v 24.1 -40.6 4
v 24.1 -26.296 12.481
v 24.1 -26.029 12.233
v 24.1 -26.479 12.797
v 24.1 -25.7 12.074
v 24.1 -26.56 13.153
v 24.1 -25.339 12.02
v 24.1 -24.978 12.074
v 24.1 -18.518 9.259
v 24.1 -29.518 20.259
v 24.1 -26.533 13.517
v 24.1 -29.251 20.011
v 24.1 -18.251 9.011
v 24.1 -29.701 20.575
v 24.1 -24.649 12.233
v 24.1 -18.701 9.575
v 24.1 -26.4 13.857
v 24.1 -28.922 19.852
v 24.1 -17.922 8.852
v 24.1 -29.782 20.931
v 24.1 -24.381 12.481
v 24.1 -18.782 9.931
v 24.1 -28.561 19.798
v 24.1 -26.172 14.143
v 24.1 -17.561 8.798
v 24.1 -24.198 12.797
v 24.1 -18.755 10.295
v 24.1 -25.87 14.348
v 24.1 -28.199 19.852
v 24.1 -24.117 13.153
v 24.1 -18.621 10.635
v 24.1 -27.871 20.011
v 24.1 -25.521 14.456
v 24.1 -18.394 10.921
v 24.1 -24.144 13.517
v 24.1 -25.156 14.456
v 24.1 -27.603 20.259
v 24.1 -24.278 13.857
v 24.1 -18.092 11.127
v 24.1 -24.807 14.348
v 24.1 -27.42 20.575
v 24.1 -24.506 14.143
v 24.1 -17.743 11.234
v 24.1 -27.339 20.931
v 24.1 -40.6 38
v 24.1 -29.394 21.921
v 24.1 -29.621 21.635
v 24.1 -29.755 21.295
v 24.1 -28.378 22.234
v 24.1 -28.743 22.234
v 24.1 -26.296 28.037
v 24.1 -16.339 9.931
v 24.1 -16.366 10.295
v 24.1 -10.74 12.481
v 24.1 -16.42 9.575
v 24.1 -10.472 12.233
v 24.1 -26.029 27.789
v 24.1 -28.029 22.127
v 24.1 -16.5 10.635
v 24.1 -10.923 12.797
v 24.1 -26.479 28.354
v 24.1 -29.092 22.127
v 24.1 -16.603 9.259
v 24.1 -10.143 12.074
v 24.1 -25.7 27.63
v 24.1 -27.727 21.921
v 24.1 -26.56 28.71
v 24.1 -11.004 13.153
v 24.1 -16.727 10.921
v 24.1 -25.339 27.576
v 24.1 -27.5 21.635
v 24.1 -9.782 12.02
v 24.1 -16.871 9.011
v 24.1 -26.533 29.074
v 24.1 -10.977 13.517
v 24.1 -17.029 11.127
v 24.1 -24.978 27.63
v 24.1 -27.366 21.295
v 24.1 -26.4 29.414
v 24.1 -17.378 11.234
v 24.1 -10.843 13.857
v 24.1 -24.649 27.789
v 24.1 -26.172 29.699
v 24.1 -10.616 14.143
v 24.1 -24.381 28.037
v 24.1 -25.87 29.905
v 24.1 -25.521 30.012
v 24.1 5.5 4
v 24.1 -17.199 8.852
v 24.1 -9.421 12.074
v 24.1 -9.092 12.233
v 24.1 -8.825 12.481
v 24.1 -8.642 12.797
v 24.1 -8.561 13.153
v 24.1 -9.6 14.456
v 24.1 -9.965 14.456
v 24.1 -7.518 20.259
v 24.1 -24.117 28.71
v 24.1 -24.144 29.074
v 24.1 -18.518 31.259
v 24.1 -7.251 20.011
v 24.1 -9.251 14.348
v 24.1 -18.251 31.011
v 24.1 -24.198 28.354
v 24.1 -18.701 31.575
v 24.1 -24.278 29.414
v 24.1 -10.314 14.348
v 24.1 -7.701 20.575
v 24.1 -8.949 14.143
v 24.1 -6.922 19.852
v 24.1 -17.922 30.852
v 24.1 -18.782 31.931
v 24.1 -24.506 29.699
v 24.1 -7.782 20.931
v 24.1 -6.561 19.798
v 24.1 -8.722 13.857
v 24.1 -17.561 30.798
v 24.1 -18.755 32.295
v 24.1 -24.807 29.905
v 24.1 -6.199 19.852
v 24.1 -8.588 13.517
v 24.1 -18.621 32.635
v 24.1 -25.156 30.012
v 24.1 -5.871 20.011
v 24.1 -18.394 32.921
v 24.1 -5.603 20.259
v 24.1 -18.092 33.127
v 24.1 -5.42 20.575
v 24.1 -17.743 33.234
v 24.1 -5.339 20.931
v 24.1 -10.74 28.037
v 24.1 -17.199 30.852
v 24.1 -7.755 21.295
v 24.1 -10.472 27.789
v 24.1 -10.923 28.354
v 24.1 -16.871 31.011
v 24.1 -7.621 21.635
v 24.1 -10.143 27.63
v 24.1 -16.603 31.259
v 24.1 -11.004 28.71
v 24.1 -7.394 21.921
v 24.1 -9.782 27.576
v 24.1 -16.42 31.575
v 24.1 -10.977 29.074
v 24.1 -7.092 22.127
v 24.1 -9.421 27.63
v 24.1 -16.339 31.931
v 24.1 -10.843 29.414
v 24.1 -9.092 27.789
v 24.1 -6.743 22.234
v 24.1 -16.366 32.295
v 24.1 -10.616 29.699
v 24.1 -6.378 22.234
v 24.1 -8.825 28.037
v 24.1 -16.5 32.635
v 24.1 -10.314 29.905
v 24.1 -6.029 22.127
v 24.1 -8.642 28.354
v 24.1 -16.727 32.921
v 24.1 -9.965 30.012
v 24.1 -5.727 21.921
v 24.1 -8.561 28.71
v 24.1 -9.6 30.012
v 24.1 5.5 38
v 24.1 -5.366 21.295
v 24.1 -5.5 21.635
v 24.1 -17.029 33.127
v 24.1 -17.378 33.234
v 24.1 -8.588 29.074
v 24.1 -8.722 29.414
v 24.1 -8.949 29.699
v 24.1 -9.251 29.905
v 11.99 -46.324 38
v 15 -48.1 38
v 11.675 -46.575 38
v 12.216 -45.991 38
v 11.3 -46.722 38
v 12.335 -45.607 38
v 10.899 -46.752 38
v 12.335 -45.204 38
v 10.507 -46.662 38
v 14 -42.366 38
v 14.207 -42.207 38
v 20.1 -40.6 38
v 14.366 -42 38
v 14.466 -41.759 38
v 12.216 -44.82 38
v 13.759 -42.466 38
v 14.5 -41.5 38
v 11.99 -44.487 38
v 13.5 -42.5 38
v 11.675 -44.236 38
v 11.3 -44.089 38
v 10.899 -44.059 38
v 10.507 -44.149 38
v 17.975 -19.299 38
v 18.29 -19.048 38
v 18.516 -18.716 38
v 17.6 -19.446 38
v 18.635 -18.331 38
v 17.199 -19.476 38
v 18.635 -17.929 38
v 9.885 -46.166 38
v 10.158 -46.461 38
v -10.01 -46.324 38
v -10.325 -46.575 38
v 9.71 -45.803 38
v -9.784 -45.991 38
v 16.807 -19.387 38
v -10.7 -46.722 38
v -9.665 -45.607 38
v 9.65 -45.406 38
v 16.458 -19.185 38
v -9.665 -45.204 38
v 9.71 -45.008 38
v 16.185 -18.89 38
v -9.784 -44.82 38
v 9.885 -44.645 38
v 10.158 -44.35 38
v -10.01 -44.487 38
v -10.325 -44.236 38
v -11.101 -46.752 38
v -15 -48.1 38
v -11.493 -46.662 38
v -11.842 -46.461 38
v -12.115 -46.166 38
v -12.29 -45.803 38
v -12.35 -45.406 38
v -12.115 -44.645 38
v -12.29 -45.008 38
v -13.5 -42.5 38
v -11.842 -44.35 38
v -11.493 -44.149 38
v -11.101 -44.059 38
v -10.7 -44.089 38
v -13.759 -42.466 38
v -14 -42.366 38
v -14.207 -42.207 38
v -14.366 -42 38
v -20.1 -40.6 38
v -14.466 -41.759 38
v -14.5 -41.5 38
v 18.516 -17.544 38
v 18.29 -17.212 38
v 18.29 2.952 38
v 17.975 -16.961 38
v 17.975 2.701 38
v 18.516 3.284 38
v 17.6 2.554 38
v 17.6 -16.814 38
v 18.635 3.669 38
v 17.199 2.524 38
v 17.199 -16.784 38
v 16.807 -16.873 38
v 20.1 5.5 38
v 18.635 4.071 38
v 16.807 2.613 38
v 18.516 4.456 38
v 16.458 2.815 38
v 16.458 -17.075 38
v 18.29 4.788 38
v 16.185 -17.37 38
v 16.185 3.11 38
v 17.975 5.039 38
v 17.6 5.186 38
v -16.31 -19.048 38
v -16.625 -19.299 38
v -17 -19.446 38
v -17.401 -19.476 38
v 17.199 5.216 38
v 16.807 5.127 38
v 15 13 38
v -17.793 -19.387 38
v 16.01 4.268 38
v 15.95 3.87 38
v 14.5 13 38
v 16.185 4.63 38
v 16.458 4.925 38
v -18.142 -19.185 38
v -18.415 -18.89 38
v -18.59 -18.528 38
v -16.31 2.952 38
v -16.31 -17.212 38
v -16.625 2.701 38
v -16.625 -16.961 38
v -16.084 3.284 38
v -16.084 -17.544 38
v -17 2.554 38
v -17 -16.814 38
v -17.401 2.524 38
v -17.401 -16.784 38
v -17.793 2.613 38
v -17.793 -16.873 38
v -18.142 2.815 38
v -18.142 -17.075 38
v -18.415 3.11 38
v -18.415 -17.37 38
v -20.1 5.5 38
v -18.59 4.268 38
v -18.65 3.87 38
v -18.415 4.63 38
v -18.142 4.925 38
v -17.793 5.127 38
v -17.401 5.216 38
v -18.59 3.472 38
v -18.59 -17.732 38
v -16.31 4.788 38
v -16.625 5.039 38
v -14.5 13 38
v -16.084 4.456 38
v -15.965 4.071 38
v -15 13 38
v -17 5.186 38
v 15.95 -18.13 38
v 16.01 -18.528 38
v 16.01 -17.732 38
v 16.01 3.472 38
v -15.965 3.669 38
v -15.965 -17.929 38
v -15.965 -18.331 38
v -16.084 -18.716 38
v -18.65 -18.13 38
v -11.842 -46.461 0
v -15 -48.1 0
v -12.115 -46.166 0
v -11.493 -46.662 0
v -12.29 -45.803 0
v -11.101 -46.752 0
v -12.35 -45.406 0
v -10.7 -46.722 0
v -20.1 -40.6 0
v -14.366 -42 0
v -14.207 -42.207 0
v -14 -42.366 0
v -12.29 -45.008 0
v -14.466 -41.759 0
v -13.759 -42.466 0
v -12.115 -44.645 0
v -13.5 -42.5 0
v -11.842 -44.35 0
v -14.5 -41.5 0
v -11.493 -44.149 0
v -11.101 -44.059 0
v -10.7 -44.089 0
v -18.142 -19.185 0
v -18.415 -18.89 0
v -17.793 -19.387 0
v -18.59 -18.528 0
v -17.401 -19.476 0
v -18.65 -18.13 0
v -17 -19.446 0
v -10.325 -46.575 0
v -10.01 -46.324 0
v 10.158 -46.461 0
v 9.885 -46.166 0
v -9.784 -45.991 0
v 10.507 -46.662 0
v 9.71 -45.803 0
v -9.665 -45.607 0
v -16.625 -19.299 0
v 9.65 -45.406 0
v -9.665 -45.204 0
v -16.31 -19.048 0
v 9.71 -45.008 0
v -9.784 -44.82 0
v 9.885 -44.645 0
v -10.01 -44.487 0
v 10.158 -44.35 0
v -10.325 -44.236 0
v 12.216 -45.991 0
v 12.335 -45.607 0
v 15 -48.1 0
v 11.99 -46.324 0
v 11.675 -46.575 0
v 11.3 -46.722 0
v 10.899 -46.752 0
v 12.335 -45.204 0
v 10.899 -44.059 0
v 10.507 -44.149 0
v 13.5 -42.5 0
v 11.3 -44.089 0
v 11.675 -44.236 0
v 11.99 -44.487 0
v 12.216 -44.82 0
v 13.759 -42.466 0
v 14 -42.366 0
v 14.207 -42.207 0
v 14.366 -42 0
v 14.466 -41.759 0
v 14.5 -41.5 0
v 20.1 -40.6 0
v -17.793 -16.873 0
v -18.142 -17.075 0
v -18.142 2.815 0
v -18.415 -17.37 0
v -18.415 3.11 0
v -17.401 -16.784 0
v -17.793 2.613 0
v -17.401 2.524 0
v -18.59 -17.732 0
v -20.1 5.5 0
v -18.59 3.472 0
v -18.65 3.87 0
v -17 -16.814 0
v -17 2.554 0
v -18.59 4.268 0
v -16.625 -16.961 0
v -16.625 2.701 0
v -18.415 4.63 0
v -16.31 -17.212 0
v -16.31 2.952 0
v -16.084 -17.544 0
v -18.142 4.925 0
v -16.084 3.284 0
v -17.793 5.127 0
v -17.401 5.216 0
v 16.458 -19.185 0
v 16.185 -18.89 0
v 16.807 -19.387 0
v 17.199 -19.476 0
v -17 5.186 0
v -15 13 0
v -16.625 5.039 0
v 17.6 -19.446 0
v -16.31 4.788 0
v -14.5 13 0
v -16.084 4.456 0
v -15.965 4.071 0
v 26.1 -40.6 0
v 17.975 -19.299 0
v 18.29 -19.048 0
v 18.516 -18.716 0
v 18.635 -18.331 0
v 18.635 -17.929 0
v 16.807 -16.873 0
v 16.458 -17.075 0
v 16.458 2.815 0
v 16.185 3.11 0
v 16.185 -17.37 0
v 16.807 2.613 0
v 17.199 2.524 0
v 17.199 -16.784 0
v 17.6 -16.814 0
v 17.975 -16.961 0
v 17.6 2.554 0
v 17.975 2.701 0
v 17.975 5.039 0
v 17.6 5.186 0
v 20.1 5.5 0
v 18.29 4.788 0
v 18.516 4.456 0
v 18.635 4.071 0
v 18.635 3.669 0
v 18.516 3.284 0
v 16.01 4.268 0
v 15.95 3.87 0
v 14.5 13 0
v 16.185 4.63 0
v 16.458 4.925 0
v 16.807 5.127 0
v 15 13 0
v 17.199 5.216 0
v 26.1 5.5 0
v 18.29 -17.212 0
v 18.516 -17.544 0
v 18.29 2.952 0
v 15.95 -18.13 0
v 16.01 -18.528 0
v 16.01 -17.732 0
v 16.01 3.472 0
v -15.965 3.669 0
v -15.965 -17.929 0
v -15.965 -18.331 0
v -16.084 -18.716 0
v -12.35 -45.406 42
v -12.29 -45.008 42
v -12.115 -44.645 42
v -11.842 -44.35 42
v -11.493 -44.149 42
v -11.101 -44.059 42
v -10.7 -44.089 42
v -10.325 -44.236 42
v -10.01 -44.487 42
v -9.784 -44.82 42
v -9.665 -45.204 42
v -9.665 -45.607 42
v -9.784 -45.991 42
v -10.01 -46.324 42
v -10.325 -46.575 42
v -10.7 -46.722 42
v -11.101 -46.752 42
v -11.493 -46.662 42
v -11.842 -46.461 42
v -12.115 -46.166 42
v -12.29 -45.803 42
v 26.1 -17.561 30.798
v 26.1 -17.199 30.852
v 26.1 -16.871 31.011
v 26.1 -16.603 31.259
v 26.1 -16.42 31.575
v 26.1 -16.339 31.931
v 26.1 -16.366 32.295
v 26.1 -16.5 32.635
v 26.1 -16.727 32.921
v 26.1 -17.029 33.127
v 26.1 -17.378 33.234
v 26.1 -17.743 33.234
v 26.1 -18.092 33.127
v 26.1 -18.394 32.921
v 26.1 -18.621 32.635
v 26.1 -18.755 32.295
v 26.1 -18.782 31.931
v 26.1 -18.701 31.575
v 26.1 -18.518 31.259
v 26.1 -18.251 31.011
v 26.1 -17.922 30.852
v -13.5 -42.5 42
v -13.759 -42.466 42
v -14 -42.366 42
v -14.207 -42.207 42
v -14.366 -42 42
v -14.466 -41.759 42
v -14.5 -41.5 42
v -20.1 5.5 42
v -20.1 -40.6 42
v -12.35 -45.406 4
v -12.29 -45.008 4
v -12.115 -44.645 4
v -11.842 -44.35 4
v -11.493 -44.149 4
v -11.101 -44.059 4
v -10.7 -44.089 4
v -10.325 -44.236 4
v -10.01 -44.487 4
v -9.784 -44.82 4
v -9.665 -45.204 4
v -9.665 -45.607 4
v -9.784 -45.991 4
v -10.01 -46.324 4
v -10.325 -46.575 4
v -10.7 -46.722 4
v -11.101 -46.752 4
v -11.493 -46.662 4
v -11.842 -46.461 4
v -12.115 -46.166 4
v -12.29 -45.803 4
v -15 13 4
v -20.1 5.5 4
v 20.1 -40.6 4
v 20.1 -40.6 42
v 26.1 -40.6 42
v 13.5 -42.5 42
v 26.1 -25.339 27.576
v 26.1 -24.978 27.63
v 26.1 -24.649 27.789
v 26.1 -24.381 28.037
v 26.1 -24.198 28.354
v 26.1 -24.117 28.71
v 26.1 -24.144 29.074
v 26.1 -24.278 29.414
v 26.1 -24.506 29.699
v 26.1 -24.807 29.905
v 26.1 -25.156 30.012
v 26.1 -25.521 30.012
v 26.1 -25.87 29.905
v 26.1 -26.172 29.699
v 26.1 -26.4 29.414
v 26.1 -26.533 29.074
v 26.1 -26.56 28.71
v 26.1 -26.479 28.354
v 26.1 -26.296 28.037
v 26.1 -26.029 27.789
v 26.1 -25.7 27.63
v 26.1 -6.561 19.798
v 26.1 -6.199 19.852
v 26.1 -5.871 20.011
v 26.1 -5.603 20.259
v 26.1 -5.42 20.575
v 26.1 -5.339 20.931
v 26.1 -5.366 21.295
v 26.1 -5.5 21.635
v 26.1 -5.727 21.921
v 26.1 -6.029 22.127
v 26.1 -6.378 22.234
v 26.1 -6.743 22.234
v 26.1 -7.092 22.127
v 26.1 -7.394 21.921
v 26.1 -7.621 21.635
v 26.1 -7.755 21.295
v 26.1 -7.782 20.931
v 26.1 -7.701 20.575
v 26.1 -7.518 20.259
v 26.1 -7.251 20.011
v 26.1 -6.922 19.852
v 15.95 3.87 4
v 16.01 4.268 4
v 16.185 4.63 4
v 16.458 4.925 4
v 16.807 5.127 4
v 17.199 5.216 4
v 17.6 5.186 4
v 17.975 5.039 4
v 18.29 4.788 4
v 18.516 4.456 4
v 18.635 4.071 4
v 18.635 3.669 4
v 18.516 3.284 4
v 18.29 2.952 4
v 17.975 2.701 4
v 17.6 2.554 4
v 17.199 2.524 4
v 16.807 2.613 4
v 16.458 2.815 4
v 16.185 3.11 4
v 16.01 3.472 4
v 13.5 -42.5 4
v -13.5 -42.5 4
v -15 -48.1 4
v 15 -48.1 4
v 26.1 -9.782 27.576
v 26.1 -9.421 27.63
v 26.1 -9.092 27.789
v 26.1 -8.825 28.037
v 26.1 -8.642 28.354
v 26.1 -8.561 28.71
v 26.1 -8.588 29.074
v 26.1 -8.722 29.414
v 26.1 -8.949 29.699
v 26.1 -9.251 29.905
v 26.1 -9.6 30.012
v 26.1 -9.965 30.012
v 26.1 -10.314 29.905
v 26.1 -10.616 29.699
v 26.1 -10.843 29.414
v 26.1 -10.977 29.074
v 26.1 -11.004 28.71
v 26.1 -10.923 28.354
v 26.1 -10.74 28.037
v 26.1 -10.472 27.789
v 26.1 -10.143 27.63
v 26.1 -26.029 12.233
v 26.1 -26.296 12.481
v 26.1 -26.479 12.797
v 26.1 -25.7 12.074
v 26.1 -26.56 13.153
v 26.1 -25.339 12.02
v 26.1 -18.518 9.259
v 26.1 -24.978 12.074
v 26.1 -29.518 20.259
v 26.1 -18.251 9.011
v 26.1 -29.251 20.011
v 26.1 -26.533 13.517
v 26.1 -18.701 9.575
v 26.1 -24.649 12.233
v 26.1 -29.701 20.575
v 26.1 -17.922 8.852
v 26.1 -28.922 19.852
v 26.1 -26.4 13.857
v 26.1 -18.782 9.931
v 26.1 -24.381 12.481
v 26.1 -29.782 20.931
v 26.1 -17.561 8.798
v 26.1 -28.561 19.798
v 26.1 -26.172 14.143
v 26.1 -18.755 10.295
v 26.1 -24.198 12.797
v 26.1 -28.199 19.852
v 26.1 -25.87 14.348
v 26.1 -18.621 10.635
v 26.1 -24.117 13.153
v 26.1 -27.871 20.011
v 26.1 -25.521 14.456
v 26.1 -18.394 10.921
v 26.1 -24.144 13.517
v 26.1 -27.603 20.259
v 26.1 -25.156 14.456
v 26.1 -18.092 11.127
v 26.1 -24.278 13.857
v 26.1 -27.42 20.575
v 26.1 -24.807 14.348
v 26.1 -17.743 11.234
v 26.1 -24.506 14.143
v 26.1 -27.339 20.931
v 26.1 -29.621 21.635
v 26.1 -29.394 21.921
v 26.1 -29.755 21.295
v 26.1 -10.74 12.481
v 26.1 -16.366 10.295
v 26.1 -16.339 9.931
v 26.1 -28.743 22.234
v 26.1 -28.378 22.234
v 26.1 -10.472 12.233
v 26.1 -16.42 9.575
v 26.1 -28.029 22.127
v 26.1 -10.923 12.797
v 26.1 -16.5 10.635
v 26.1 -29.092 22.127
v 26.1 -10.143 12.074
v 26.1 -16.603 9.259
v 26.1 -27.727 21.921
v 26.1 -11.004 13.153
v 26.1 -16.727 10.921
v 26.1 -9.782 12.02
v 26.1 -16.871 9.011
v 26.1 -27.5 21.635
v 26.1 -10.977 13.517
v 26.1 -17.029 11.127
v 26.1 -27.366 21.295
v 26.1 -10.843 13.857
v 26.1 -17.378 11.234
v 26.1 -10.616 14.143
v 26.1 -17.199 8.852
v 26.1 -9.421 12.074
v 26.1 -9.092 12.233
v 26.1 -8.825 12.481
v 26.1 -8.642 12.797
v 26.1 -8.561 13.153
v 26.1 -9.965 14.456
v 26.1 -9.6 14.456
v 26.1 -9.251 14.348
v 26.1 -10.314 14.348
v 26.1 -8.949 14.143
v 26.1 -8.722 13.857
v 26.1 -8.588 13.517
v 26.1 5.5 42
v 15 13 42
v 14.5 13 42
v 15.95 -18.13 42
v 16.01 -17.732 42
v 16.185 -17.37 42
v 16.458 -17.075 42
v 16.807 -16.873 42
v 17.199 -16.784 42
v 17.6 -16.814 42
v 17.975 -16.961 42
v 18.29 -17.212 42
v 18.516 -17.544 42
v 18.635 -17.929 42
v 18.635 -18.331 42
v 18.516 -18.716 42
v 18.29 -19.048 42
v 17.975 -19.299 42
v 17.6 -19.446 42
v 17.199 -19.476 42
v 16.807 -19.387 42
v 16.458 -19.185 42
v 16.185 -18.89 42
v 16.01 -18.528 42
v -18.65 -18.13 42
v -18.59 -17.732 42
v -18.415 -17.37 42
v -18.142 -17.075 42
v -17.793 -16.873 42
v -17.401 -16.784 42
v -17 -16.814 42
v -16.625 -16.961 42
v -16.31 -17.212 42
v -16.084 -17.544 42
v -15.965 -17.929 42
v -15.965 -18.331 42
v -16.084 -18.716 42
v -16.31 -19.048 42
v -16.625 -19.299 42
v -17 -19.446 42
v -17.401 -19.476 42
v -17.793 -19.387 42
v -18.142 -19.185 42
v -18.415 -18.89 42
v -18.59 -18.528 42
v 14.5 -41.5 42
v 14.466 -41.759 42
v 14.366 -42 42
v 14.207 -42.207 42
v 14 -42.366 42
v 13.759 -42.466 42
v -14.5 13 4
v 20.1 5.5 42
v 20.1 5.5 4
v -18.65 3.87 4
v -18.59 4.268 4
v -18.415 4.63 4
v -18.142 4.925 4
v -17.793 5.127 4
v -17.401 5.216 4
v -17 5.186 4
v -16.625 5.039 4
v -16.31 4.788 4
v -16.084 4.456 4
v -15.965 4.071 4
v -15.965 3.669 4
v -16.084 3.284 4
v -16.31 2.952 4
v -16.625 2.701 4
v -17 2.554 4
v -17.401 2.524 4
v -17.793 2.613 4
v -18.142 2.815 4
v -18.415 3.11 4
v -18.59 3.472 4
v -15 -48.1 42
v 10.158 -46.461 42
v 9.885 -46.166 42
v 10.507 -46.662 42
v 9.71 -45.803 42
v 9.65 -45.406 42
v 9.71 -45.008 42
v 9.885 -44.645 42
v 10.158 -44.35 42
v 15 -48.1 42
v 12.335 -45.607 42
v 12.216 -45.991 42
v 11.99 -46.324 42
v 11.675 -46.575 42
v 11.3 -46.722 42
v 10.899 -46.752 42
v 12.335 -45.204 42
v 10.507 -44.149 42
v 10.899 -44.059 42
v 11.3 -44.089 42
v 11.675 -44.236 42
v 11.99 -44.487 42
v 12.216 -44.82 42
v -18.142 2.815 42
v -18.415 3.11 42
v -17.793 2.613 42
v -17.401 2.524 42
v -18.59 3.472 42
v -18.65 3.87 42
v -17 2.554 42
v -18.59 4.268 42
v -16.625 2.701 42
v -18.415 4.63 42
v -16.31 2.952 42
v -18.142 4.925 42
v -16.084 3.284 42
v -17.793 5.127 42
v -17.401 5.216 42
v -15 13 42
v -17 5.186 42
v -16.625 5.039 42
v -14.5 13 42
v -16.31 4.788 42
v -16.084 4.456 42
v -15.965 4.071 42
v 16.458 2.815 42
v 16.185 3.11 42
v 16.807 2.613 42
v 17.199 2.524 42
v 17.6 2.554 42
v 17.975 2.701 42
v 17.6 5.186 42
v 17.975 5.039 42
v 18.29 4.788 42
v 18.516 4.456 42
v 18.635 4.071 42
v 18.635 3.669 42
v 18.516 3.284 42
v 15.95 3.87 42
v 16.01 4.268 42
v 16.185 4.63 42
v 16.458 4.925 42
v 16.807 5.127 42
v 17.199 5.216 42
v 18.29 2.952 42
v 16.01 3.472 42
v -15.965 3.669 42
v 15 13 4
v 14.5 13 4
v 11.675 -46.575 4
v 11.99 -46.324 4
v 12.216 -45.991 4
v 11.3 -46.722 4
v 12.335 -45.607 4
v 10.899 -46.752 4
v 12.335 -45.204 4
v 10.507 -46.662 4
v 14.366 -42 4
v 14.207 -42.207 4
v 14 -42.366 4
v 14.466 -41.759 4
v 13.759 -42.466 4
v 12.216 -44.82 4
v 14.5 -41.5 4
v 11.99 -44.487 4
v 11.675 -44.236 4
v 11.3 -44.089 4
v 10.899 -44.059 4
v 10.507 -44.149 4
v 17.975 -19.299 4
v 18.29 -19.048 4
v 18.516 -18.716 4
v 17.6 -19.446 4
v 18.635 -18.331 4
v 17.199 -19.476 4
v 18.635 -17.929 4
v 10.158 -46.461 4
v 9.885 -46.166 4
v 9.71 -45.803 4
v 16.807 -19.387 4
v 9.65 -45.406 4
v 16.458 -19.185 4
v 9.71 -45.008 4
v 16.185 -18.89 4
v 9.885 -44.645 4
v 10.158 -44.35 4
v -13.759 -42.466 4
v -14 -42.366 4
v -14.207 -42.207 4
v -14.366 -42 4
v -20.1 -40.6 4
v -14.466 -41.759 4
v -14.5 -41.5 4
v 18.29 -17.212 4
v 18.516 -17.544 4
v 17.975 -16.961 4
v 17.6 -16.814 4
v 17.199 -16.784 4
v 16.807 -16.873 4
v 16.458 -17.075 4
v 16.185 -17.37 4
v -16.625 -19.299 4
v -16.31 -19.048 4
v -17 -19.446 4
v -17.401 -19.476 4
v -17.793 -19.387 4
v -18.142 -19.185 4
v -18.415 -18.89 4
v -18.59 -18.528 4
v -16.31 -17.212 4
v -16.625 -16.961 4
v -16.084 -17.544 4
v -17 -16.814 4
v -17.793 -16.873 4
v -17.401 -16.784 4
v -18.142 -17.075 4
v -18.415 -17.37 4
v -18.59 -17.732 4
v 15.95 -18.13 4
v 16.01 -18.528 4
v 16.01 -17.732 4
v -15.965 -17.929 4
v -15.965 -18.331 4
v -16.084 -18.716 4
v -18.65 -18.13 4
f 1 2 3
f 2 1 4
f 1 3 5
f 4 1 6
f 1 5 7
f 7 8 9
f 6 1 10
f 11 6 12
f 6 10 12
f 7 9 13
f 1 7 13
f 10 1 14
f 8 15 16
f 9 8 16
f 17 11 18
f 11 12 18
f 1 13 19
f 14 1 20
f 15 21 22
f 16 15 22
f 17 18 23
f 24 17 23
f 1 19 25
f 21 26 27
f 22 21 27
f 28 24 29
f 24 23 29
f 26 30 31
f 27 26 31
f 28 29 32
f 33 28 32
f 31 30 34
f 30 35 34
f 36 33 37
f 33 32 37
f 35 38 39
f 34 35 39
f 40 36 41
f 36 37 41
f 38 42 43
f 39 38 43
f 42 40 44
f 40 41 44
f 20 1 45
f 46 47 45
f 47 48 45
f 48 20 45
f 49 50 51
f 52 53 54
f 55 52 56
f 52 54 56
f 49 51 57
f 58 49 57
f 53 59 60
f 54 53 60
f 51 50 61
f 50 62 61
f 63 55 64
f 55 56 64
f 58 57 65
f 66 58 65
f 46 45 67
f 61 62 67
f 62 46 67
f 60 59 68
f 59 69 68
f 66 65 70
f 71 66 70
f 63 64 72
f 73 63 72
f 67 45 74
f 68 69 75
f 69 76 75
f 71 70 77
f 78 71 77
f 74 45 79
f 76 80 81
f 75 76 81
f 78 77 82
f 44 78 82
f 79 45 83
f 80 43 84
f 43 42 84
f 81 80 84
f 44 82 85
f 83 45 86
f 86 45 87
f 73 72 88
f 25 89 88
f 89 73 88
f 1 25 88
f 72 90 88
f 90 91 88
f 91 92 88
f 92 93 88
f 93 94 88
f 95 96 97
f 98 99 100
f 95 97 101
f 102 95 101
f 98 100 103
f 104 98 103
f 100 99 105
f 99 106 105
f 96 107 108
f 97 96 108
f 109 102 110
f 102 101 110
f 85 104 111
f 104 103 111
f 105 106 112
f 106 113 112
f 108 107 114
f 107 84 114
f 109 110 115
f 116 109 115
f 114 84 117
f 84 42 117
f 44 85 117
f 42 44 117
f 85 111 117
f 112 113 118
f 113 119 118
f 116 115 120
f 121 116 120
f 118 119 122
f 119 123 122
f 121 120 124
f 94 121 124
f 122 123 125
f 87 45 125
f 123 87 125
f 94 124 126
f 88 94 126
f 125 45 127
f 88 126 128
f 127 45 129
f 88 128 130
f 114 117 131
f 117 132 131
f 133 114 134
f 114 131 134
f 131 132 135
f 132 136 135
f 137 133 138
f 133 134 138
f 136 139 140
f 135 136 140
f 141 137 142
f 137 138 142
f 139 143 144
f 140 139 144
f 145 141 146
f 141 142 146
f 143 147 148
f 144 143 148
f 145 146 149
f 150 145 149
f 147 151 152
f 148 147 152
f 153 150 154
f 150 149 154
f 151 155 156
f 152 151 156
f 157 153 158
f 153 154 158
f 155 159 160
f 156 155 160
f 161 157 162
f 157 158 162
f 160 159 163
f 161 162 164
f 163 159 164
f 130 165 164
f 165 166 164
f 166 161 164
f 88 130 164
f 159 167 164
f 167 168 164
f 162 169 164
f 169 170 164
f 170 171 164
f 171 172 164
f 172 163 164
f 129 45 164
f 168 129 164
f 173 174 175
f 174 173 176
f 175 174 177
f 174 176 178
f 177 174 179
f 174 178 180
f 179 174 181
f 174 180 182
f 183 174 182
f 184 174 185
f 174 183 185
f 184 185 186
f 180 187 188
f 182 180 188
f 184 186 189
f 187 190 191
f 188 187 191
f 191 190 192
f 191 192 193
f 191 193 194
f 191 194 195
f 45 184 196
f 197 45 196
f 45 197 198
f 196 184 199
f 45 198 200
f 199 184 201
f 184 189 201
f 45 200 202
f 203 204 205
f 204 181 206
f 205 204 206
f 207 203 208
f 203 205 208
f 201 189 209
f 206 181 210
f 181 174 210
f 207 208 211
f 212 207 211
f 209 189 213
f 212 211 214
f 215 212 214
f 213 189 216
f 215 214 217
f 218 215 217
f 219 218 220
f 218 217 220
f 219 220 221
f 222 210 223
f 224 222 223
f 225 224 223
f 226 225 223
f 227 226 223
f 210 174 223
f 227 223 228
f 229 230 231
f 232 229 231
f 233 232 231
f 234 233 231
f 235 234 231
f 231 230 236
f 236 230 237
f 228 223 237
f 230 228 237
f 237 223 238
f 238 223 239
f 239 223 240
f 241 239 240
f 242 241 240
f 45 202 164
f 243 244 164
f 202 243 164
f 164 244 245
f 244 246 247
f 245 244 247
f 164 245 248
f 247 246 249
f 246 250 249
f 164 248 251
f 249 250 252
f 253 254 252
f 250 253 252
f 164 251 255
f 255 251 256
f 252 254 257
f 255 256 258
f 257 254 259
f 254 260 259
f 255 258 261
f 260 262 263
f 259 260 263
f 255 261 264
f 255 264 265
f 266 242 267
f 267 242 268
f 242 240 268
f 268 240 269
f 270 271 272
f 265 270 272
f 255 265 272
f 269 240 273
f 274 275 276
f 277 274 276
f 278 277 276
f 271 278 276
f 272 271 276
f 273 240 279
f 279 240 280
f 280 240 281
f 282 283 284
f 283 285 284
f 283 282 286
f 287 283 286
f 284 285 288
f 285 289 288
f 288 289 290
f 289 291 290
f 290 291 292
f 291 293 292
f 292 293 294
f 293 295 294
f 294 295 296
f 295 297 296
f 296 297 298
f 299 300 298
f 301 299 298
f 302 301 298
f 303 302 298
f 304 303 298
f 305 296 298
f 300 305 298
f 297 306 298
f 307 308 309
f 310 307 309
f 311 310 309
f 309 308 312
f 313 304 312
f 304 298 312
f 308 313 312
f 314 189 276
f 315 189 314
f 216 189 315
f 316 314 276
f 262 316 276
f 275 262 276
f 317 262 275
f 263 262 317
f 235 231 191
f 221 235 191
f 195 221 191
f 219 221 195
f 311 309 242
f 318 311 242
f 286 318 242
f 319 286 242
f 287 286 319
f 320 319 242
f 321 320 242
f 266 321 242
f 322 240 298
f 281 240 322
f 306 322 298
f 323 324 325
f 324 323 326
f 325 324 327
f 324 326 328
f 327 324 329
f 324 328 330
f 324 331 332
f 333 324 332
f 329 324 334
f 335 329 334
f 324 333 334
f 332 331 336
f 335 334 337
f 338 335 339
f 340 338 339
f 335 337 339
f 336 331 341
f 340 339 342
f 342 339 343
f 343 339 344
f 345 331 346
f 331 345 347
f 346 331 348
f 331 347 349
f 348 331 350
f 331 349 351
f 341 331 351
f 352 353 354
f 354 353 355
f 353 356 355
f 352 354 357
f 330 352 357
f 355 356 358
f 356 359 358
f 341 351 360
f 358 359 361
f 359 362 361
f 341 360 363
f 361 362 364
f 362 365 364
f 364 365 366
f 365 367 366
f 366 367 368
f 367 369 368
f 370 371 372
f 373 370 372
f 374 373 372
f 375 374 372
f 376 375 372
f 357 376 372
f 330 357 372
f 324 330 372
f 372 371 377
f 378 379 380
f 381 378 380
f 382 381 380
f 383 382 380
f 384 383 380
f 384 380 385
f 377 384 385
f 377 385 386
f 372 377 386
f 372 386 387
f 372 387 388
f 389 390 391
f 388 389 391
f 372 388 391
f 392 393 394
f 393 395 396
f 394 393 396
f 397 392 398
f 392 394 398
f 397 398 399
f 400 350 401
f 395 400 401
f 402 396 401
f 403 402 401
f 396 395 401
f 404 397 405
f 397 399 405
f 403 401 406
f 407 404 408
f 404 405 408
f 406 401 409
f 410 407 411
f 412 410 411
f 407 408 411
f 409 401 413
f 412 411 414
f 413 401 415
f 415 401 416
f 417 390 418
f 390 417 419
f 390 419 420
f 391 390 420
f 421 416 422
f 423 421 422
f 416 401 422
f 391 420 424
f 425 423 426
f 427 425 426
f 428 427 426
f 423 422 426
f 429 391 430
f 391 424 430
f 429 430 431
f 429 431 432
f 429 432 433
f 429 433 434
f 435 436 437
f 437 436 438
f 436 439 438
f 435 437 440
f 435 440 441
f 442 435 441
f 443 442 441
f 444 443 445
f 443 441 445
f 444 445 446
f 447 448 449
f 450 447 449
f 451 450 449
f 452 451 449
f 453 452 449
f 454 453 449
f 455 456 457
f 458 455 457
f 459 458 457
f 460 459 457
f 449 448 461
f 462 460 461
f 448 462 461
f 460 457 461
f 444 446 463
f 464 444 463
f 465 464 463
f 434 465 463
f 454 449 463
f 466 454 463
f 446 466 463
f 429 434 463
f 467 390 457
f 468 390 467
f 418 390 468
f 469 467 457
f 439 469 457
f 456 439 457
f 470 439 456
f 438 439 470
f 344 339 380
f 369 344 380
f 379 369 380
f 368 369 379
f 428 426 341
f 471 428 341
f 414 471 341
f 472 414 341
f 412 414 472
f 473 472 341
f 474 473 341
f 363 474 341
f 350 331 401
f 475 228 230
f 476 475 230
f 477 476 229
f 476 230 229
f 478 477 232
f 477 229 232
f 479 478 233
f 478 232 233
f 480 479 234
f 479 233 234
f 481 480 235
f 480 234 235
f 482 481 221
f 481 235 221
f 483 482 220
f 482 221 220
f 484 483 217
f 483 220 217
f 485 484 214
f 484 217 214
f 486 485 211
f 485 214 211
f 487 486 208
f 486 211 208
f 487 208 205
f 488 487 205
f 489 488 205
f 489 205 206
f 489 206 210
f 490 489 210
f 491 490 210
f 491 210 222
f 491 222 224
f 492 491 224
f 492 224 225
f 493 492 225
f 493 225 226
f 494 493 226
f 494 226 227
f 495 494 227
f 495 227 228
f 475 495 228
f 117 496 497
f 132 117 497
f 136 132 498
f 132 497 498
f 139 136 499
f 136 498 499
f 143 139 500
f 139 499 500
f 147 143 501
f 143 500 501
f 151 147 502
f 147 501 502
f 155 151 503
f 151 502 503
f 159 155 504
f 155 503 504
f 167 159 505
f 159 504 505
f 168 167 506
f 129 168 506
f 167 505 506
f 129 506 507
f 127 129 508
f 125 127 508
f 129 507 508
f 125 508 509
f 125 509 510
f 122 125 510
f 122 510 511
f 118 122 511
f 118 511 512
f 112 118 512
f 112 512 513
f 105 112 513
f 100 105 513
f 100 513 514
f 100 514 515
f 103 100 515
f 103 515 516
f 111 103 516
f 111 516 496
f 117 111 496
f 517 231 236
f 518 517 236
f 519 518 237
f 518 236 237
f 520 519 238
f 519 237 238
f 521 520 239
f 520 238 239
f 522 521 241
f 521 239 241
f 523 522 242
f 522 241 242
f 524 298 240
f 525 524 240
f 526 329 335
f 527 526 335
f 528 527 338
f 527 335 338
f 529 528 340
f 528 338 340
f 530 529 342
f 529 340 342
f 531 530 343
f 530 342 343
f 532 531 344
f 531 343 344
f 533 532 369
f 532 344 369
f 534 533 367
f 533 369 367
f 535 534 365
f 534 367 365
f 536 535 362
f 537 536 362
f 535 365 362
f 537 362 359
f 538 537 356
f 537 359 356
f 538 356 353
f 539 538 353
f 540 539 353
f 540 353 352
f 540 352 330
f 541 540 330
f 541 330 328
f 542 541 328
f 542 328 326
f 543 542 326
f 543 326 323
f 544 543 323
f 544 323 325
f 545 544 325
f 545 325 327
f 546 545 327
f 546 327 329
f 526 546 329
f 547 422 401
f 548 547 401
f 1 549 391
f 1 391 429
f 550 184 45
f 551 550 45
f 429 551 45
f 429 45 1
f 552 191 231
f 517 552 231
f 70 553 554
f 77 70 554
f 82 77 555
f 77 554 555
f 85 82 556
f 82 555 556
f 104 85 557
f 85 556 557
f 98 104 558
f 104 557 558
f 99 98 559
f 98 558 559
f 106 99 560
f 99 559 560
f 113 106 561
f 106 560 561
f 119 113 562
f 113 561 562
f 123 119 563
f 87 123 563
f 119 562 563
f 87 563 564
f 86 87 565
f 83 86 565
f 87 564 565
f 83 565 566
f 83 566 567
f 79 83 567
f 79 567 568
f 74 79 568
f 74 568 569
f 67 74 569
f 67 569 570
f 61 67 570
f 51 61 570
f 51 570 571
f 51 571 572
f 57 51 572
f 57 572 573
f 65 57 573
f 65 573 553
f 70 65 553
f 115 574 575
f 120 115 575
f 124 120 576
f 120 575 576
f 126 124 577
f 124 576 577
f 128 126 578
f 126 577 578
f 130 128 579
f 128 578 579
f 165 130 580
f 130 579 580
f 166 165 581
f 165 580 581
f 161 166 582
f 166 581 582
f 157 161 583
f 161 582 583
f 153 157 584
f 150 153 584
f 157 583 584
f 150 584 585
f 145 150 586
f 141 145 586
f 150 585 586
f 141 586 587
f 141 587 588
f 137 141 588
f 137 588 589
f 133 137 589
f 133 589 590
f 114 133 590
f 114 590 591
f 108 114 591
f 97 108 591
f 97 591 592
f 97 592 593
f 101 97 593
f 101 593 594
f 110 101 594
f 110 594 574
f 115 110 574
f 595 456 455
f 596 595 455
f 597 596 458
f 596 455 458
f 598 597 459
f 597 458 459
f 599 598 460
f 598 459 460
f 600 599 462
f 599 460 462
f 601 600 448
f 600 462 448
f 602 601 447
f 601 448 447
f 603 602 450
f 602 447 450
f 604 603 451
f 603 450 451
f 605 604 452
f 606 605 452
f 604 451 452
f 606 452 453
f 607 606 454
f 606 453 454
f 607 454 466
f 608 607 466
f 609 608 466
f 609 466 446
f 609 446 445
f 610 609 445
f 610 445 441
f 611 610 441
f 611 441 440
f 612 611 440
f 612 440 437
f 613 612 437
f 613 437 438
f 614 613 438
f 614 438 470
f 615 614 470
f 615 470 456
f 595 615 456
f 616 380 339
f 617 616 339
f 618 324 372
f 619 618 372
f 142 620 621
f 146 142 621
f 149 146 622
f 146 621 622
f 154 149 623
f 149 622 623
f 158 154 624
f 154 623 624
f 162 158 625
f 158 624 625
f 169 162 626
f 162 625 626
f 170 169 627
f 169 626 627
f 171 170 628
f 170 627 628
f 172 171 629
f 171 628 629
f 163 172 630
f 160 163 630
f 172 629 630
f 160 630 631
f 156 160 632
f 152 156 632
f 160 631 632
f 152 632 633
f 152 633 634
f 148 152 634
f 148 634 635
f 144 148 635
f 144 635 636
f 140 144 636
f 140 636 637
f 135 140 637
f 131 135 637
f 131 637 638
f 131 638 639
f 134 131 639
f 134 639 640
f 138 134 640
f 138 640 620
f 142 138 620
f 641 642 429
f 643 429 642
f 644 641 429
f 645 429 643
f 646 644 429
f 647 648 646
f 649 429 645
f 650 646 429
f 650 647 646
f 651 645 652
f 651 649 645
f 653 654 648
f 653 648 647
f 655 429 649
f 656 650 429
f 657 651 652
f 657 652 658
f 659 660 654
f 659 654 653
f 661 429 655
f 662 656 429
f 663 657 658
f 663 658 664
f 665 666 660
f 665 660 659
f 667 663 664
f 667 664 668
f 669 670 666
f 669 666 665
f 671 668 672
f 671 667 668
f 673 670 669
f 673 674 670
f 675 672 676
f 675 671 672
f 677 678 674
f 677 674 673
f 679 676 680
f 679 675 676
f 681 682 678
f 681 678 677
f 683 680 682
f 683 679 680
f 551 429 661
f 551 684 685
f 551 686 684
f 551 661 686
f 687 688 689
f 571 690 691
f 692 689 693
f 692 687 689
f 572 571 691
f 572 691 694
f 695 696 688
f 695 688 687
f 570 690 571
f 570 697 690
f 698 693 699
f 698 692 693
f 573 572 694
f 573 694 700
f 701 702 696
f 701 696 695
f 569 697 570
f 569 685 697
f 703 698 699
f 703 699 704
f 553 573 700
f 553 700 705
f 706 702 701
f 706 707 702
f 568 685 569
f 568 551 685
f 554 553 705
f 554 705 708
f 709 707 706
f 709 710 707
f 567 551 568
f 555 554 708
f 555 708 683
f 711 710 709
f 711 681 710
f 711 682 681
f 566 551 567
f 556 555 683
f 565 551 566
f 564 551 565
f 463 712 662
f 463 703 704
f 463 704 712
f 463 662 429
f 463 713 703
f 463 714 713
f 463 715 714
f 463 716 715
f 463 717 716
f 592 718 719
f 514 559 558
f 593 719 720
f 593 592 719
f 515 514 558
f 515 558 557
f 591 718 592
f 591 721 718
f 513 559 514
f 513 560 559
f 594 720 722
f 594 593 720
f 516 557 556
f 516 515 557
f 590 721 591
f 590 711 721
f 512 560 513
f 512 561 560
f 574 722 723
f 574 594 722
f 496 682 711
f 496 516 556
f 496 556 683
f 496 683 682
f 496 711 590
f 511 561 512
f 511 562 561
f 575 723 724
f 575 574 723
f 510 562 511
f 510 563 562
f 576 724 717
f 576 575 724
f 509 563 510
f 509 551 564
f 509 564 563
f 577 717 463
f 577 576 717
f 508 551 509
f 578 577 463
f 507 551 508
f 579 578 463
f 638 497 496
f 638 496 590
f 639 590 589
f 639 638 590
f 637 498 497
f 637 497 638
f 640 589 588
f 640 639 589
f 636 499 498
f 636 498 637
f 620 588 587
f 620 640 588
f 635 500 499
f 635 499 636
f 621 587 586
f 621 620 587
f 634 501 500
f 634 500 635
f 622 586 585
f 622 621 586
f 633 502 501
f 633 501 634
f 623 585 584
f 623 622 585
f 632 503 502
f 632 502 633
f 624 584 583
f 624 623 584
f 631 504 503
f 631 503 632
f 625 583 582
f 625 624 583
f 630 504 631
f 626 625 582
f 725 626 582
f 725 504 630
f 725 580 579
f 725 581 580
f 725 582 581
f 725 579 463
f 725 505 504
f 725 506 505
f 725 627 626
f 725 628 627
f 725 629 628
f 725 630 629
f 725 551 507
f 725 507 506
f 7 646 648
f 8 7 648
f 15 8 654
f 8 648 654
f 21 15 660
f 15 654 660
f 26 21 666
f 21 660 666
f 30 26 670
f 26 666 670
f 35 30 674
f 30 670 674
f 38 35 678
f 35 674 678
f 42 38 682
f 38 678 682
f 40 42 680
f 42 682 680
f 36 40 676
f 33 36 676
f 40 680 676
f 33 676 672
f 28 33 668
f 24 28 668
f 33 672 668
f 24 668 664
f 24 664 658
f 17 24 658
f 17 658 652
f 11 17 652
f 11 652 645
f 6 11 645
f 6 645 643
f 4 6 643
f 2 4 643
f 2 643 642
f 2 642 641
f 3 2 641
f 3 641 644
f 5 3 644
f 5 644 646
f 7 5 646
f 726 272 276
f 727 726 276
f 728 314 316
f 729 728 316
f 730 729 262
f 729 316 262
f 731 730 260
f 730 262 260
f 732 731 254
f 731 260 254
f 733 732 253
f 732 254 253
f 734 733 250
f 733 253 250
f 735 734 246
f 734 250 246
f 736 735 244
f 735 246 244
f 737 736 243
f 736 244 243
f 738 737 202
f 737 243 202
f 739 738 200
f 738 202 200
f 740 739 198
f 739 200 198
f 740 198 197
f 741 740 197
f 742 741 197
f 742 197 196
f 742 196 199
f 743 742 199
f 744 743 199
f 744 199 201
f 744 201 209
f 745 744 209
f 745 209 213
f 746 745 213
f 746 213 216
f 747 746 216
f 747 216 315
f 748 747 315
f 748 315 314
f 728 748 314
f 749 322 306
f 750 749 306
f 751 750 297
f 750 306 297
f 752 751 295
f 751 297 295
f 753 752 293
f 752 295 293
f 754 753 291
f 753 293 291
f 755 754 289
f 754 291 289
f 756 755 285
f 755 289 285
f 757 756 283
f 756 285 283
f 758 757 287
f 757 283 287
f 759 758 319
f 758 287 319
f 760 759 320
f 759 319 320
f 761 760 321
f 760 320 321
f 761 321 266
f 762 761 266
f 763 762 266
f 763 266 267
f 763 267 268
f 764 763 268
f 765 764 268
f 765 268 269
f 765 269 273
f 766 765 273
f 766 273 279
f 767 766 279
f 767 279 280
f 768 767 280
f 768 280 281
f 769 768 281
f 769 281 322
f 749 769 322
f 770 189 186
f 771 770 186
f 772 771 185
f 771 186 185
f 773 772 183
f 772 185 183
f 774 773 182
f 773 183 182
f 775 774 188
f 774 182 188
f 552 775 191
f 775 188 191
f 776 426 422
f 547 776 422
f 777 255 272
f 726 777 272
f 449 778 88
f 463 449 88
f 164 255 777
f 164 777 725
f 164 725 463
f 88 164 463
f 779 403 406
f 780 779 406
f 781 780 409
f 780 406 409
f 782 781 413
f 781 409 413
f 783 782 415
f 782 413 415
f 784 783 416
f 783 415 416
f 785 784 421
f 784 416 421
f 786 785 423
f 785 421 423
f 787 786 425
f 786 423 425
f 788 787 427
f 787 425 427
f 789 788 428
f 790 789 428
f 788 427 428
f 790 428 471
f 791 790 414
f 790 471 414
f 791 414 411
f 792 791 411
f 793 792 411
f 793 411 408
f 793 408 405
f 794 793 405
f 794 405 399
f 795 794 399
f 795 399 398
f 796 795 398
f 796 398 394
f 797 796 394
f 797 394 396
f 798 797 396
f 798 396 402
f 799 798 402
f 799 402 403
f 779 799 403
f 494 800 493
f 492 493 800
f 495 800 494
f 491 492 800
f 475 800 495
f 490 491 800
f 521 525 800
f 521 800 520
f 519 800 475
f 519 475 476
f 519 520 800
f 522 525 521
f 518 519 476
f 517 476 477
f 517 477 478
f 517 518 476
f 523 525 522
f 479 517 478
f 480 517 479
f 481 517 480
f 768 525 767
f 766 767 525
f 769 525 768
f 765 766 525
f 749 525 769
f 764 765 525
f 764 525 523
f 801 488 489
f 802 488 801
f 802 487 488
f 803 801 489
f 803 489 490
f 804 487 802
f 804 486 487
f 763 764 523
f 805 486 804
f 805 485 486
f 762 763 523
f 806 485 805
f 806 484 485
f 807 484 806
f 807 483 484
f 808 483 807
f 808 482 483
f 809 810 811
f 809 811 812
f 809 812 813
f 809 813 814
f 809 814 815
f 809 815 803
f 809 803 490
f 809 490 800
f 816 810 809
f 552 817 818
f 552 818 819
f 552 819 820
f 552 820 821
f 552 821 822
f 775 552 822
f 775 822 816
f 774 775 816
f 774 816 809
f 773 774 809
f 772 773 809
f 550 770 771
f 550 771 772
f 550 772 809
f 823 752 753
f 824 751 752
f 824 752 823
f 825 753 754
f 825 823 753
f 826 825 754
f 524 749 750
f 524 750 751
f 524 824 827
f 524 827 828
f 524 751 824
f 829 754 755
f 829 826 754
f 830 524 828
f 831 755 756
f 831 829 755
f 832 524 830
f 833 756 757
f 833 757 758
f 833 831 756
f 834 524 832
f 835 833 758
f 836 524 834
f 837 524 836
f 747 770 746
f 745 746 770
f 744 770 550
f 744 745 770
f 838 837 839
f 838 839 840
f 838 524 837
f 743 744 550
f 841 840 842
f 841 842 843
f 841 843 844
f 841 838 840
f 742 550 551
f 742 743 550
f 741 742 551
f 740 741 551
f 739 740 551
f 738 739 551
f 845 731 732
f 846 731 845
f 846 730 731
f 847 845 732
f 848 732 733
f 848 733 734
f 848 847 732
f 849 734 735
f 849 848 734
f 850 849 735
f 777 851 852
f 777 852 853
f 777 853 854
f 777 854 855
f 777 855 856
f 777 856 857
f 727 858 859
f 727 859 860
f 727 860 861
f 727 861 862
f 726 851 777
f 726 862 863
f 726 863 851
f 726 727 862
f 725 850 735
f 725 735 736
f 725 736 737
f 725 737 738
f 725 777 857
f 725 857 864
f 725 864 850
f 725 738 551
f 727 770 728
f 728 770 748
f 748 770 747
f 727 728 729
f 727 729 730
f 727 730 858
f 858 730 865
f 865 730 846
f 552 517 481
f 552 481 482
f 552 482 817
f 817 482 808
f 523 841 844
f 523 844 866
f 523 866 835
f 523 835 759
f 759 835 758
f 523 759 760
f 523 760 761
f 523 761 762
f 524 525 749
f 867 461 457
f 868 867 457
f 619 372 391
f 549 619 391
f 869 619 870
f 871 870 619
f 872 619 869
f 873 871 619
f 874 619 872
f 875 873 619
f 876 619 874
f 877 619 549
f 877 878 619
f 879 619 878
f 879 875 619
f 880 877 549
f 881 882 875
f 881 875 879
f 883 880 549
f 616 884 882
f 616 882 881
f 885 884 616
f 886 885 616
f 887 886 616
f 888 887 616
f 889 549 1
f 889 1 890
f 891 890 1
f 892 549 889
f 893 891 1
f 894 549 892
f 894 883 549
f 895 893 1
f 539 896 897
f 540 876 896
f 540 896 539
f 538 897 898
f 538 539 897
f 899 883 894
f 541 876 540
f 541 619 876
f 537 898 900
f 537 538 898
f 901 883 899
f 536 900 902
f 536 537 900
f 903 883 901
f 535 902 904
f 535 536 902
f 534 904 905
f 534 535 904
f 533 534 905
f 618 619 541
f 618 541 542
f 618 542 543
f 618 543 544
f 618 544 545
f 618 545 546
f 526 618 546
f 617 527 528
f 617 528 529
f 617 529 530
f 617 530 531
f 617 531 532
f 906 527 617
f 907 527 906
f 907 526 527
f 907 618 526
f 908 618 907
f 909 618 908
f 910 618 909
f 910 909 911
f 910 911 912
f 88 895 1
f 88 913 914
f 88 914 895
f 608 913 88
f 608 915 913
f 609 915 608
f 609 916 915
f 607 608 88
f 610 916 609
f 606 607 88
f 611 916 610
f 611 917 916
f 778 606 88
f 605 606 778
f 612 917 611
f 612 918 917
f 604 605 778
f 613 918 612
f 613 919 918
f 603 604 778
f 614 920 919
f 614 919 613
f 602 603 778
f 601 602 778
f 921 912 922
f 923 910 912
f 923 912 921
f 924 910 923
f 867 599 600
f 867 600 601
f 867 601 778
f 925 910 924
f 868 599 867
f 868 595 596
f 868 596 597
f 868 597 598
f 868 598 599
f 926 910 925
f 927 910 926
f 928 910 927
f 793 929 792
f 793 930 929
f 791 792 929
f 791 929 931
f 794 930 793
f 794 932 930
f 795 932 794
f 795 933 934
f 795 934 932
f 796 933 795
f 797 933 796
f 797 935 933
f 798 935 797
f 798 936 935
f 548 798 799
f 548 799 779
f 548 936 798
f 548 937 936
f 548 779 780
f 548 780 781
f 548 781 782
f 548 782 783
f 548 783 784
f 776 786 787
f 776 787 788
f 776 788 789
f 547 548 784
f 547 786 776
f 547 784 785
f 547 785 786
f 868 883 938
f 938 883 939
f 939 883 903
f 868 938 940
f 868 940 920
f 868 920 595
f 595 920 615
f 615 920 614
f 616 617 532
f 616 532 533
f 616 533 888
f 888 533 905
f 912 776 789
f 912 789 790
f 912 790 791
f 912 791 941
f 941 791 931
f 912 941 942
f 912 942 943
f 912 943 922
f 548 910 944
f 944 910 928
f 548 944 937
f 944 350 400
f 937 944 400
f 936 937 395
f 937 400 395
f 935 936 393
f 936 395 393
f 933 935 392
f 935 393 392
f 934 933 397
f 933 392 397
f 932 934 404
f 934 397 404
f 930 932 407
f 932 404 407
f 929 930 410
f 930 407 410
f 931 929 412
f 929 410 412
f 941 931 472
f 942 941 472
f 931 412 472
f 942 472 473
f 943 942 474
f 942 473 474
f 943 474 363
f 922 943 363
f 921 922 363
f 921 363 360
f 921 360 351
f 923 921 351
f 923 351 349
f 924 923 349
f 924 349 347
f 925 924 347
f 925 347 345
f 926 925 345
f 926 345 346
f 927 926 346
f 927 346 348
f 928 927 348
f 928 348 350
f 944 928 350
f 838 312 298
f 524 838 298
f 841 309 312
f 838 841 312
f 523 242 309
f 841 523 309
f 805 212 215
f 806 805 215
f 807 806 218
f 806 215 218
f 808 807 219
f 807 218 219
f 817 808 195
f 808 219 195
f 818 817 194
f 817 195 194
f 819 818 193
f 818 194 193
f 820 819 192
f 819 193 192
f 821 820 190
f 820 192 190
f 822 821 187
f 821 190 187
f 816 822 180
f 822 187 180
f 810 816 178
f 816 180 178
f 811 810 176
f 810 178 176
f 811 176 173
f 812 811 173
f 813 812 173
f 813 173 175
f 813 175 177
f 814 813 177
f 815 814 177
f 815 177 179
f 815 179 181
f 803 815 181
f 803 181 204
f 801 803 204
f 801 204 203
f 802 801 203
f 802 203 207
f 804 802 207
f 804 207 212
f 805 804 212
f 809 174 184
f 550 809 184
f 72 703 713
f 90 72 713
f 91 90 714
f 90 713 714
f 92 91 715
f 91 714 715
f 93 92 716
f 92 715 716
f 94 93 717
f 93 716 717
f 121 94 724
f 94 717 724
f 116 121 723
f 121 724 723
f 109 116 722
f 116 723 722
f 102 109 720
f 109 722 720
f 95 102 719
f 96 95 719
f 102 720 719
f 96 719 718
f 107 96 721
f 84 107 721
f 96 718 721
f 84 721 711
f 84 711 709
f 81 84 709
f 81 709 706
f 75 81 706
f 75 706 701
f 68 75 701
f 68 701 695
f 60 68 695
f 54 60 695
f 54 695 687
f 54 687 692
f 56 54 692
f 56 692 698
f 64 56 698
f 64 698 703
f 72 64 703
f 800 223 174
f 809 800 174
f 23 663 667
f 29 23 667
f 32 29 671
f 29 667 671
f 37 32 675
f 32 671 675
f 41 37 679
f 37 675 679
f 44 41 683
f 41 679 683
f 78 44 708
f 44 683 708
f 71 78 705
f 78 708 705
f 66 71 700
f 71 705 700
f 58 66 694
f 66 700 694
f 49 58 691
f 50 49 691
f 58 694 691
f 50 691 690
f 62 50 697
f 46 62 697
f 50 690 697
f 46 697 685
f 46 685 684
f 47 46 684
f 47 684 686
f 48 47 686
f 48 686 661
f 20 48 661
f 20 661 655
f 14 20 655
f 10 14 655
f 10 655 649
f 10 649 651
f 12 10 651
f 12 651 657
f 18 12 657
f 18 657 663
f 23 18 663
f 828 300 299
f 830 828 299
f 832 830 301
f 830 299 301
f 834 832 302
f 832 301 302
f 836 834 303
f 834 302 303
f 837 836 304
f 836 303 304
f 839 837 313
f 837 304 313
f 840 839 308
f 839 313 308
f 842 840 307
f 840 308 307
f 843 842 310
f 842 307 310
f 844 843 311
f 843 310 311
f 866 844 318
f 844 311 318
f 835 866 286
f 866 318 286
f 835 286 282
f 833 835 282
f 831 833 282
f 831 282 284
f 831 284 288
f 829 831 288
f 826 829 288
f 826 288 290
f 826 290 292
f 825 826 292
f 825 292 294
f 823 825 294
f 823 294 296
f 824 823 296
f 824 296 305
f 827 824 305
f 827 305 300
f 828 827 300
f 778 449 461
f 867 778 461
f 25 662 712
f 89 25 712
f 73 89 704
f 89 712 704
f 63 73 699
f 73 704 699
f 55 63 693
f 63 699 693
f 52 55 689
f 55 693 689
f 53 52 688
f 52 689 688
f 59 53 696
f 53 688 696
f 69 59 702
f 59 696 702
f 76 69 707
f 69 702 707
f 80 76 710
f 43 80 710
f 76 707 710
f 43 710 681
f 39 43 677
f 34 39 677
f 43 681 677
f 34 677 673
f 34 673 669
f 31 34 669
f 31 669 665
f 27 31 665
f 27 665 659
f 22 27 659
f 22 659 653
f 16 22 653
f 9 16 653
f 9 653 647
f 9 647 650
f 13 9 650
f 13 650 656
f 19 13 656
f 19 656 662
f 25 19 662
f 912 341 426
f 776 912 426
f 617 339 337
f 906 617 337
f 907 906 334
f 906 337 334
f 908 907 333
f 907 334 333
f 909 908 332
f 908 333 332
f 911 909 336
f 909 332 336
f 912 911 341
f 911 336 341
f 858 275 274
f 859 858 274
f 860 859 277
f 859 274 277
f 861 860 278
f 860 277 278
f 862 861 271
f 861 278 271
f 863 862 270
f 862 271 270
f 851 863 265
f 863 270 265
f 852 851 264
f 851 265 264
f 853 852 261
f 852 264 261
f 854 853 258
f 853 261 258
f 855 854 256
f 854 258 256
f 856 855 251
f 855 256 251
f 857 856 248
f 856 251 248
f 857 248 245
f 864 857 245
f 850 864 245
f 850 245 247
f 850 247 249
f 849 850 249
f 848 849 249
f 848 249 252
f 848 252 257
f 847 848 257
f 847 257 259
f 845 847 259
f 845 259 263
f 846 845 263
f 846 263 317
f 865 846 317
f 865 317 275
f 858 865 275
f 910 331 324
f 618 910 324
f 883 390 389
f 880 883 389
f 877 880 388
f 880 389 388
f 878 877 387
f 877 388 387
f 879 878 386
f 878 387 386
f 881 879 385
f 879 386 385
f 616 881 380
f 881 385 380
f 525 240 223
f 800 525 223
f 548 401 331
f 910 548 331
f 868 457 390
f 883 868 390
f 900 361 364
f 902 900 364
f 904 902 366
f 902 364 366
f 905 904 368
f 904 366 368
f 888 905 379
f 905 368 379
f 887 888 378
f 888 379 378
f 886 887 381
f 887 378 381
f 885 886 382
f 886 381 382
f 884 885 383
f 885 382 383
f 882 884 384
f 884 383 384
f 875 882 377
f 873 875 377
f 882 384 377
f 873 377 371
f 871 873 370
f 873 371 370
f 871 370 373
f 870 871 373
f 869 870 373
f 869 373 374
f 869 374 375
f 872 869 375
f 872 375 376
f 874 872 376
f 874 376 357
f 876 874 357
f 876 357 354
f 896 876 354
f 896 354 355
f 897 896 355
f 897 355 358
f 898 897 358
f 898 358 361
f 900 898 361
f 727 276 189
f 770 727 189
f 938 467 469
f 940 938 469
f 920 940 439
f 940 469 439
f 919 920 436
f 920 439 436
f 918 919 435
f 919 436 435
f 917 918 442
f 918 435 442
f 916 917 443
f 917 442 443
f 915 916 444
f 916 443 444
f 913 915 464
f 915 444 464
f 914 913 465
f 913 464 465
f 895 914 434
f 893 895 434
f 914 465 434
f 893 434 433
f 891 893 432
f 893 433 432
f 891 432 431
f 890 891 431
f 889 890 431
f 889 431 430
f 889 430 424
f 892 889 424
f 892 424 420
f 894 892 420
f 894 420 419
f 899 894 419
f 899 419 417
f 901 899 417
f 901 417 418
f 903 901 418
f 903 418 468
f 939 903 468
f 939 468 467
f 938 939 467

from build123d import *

# Parameters (mm, degrees)
EXTRUDE_2_DEPTH     = 42
SKETCH_2_R          = 1.35
CUT_EXTRUDE_1_DEPTH = 45
CUT_EXTRUDE_2_DEPTH = 45
SKETCH_4_W          = 4
SKETCH_4_H          = 46.1
EXTRUDE_3_DEPTH     = 4
SKETCH_5_W          = 2
SKETCH_5_H          = 46.1
EXTRUDE_4_DEPTH     = 42
SKETCH_6_R          = 1.225
CUT_EXTRUDE_3_DEPTH = 10


with BuildPart() as part:
    # 스케치1 → 보스-돌출2 (new body)
    with BuildSketch(Plane.XY):
        with BuildLine():
            Line((-14.5, -41.5), (-14.5, 11.5))
            Line((-14.5, 11.5), (-14.5, 13))
            Line((-14.5, 13), (-15, 13))
            Line((-15, 13), (-20.1, 5.5))
            Line((-20.1, 5.5), (-20.1, -40.6))
            Line((-20.1, -40.6), (-15, -48.1))
            Line((-15, -48.1), (15, -48.1))
            Line((15, -48.1), (20.1, -40.6))
            Line((20.1, -40.6), (20.1, 5.5))
            Line((20.1, 5.5), (15, 13))
            Line((15, 13), (14.5, 13))
            Line((14.5, 13), (14.5, 11.5))
            Line((14.5, 11.5), (14.5, -41.5))
            ThreePointArc((14.5, -41.5), (14.207106781, -42.207106781), (13.5, -42.5))
            Line((13.5, -42.5), (-13.5, -42.5))
            ThreePointArc((-13.5, -42.5), (-14.207106781, -42.207106781), (-14.5, -41.5))
        make_face()
    extrude(amount=EXTRUDE_2_DEPTH)

    # 스케치2 → 컷-돌출1 (cut)
    with BuildSketch(Plane(origin=(0, 0, 0), x_dir=(-1, 0, 0), z_dir=(0, 0, -1))):
        with Locations((-11, -45.405560676)):
            Circle(SKETCH_2_R)
        with Locations((11, -45.405560676)):
            Circle(SKETCH_2_R)
        with Locations((17.3, 3.87)):
            Circle(SKETCH_2_R)
        with Locations((17.3, -18.13)):
            Circle(SKETCH_2_R)
        with Locations((-17.3, 3.87)):
            Circle(SKETCH_2_R)
        with Locations((-17.3, -18.13)):
            Circle(SKETCH_2_R)
    extrude(amount=-CUT_EXTRUDE_1_DEPTH, mode=Mode.SUBTRACT)

    # 스케치3 → 컷-돌출2 (cut)
    with BuildSketch(Plane(origin=(20.1, 0, 0), x_dir=(0, 0, -1), z_dir=(1, 0, 0))):
        Polygon((-38, 5.5), (-38, -40.6), (-38, -48.1), (-4, -48.1), (-4, -40.6), (-4, 5.5), (-4, 13), (-38, 13), align=None)
    extrude(amount=-CUT_EXTRUDE_2_DEPTH, mode=Mode.SUBTRACT)


with BuildPart() as cut_extrude_2_piece_1:
    # of the separate pieces the step leaves, piece 1, a body of its own (cut_extrude_2_pieces)
    add(part.part.solids().sort_by_distance((-14.5, -41.5, 38))[0])



with BuildPart() as cut_extrude_2_piece_2:
    # of the separate pieces the step leaves, piece 2, a body of its own (cut_extrude_2_pieces)
    add(part.part.solids().sort_by_distance((-14.5, -41.5, 0))[0])


with BuildPart() as cut_extrude_2_piece_1_1:
    add(cut_extrude_2_piece_1.part)

    add(cut_extrude_2_piece_2.part)  # 보스-돌출3 merges 컷-돌출2 piece 2
    # 스케치4 → 보스-돌출3 (add)
    with BuildSketch(Plane(origin=(20.1, 0, 0), x_dir=(0, 0, -1), z_dir=(1, 0, 0))):
        with Locations((-40, -17.55)):
            Rectangle(SKETCH_4_W, SKETCH_4_H)
        with Locations((-2, -17.55)):
            Rectangle(SKETCH_4_W, SKETCH_4_H)
    extrude(amount=EXTRUDE_3_DEPTH)

    # 스케치5 → 보스-돌출4 (add)
    with BuildSketch(Plane.XY.offset(42)):
        with Locations((25.1, -17.55)):
            Rectangle(SKETCH_5_W, SKETCH_5_H)
    extrude(amount=-EXTRUDE_4_DEPTH)

    # 스케치6 → 컷-돌출3 (cut)
    with BuildSketch(Plane(origin=(26.1, 0, 0), x_dir=(0, 0, -1), z_dir=(1, 0, 0))):
        with Locations((-28.801064549, -9.782397482)):
            Circle(SKETCH_6_R)
        with Locations((-21.022889956, -6.560572075)):
            Circle(SKETCH_6_R)
        with Locations((-13.244715363, -9.782397482)):
            Circle(SKETCH_6_R)
        with Locations((-10.022889956, -17.560572075)):
            Circle(SKETCH_6_R)
        with Locations((-13.244715363, -25.338746668)):
            Circle(SKETCH_6_R)
        with Locations((-21.022889956, -28.560572075)):
            Circle(SKETCH_6_R)
        with Locations((-28.801064549, -25.338746668)):
            Circle(SKETCH_6_R)
        with Locations((-32.022889956, -17.560572075)):
            Circle(SKETCH_6_R)
    extrude(amount=-CUT_EXTRUDE_3_DEPTH, mode=Mode.SUBTRACT)


solid = cut_extrude_2_piece_1_1.part
